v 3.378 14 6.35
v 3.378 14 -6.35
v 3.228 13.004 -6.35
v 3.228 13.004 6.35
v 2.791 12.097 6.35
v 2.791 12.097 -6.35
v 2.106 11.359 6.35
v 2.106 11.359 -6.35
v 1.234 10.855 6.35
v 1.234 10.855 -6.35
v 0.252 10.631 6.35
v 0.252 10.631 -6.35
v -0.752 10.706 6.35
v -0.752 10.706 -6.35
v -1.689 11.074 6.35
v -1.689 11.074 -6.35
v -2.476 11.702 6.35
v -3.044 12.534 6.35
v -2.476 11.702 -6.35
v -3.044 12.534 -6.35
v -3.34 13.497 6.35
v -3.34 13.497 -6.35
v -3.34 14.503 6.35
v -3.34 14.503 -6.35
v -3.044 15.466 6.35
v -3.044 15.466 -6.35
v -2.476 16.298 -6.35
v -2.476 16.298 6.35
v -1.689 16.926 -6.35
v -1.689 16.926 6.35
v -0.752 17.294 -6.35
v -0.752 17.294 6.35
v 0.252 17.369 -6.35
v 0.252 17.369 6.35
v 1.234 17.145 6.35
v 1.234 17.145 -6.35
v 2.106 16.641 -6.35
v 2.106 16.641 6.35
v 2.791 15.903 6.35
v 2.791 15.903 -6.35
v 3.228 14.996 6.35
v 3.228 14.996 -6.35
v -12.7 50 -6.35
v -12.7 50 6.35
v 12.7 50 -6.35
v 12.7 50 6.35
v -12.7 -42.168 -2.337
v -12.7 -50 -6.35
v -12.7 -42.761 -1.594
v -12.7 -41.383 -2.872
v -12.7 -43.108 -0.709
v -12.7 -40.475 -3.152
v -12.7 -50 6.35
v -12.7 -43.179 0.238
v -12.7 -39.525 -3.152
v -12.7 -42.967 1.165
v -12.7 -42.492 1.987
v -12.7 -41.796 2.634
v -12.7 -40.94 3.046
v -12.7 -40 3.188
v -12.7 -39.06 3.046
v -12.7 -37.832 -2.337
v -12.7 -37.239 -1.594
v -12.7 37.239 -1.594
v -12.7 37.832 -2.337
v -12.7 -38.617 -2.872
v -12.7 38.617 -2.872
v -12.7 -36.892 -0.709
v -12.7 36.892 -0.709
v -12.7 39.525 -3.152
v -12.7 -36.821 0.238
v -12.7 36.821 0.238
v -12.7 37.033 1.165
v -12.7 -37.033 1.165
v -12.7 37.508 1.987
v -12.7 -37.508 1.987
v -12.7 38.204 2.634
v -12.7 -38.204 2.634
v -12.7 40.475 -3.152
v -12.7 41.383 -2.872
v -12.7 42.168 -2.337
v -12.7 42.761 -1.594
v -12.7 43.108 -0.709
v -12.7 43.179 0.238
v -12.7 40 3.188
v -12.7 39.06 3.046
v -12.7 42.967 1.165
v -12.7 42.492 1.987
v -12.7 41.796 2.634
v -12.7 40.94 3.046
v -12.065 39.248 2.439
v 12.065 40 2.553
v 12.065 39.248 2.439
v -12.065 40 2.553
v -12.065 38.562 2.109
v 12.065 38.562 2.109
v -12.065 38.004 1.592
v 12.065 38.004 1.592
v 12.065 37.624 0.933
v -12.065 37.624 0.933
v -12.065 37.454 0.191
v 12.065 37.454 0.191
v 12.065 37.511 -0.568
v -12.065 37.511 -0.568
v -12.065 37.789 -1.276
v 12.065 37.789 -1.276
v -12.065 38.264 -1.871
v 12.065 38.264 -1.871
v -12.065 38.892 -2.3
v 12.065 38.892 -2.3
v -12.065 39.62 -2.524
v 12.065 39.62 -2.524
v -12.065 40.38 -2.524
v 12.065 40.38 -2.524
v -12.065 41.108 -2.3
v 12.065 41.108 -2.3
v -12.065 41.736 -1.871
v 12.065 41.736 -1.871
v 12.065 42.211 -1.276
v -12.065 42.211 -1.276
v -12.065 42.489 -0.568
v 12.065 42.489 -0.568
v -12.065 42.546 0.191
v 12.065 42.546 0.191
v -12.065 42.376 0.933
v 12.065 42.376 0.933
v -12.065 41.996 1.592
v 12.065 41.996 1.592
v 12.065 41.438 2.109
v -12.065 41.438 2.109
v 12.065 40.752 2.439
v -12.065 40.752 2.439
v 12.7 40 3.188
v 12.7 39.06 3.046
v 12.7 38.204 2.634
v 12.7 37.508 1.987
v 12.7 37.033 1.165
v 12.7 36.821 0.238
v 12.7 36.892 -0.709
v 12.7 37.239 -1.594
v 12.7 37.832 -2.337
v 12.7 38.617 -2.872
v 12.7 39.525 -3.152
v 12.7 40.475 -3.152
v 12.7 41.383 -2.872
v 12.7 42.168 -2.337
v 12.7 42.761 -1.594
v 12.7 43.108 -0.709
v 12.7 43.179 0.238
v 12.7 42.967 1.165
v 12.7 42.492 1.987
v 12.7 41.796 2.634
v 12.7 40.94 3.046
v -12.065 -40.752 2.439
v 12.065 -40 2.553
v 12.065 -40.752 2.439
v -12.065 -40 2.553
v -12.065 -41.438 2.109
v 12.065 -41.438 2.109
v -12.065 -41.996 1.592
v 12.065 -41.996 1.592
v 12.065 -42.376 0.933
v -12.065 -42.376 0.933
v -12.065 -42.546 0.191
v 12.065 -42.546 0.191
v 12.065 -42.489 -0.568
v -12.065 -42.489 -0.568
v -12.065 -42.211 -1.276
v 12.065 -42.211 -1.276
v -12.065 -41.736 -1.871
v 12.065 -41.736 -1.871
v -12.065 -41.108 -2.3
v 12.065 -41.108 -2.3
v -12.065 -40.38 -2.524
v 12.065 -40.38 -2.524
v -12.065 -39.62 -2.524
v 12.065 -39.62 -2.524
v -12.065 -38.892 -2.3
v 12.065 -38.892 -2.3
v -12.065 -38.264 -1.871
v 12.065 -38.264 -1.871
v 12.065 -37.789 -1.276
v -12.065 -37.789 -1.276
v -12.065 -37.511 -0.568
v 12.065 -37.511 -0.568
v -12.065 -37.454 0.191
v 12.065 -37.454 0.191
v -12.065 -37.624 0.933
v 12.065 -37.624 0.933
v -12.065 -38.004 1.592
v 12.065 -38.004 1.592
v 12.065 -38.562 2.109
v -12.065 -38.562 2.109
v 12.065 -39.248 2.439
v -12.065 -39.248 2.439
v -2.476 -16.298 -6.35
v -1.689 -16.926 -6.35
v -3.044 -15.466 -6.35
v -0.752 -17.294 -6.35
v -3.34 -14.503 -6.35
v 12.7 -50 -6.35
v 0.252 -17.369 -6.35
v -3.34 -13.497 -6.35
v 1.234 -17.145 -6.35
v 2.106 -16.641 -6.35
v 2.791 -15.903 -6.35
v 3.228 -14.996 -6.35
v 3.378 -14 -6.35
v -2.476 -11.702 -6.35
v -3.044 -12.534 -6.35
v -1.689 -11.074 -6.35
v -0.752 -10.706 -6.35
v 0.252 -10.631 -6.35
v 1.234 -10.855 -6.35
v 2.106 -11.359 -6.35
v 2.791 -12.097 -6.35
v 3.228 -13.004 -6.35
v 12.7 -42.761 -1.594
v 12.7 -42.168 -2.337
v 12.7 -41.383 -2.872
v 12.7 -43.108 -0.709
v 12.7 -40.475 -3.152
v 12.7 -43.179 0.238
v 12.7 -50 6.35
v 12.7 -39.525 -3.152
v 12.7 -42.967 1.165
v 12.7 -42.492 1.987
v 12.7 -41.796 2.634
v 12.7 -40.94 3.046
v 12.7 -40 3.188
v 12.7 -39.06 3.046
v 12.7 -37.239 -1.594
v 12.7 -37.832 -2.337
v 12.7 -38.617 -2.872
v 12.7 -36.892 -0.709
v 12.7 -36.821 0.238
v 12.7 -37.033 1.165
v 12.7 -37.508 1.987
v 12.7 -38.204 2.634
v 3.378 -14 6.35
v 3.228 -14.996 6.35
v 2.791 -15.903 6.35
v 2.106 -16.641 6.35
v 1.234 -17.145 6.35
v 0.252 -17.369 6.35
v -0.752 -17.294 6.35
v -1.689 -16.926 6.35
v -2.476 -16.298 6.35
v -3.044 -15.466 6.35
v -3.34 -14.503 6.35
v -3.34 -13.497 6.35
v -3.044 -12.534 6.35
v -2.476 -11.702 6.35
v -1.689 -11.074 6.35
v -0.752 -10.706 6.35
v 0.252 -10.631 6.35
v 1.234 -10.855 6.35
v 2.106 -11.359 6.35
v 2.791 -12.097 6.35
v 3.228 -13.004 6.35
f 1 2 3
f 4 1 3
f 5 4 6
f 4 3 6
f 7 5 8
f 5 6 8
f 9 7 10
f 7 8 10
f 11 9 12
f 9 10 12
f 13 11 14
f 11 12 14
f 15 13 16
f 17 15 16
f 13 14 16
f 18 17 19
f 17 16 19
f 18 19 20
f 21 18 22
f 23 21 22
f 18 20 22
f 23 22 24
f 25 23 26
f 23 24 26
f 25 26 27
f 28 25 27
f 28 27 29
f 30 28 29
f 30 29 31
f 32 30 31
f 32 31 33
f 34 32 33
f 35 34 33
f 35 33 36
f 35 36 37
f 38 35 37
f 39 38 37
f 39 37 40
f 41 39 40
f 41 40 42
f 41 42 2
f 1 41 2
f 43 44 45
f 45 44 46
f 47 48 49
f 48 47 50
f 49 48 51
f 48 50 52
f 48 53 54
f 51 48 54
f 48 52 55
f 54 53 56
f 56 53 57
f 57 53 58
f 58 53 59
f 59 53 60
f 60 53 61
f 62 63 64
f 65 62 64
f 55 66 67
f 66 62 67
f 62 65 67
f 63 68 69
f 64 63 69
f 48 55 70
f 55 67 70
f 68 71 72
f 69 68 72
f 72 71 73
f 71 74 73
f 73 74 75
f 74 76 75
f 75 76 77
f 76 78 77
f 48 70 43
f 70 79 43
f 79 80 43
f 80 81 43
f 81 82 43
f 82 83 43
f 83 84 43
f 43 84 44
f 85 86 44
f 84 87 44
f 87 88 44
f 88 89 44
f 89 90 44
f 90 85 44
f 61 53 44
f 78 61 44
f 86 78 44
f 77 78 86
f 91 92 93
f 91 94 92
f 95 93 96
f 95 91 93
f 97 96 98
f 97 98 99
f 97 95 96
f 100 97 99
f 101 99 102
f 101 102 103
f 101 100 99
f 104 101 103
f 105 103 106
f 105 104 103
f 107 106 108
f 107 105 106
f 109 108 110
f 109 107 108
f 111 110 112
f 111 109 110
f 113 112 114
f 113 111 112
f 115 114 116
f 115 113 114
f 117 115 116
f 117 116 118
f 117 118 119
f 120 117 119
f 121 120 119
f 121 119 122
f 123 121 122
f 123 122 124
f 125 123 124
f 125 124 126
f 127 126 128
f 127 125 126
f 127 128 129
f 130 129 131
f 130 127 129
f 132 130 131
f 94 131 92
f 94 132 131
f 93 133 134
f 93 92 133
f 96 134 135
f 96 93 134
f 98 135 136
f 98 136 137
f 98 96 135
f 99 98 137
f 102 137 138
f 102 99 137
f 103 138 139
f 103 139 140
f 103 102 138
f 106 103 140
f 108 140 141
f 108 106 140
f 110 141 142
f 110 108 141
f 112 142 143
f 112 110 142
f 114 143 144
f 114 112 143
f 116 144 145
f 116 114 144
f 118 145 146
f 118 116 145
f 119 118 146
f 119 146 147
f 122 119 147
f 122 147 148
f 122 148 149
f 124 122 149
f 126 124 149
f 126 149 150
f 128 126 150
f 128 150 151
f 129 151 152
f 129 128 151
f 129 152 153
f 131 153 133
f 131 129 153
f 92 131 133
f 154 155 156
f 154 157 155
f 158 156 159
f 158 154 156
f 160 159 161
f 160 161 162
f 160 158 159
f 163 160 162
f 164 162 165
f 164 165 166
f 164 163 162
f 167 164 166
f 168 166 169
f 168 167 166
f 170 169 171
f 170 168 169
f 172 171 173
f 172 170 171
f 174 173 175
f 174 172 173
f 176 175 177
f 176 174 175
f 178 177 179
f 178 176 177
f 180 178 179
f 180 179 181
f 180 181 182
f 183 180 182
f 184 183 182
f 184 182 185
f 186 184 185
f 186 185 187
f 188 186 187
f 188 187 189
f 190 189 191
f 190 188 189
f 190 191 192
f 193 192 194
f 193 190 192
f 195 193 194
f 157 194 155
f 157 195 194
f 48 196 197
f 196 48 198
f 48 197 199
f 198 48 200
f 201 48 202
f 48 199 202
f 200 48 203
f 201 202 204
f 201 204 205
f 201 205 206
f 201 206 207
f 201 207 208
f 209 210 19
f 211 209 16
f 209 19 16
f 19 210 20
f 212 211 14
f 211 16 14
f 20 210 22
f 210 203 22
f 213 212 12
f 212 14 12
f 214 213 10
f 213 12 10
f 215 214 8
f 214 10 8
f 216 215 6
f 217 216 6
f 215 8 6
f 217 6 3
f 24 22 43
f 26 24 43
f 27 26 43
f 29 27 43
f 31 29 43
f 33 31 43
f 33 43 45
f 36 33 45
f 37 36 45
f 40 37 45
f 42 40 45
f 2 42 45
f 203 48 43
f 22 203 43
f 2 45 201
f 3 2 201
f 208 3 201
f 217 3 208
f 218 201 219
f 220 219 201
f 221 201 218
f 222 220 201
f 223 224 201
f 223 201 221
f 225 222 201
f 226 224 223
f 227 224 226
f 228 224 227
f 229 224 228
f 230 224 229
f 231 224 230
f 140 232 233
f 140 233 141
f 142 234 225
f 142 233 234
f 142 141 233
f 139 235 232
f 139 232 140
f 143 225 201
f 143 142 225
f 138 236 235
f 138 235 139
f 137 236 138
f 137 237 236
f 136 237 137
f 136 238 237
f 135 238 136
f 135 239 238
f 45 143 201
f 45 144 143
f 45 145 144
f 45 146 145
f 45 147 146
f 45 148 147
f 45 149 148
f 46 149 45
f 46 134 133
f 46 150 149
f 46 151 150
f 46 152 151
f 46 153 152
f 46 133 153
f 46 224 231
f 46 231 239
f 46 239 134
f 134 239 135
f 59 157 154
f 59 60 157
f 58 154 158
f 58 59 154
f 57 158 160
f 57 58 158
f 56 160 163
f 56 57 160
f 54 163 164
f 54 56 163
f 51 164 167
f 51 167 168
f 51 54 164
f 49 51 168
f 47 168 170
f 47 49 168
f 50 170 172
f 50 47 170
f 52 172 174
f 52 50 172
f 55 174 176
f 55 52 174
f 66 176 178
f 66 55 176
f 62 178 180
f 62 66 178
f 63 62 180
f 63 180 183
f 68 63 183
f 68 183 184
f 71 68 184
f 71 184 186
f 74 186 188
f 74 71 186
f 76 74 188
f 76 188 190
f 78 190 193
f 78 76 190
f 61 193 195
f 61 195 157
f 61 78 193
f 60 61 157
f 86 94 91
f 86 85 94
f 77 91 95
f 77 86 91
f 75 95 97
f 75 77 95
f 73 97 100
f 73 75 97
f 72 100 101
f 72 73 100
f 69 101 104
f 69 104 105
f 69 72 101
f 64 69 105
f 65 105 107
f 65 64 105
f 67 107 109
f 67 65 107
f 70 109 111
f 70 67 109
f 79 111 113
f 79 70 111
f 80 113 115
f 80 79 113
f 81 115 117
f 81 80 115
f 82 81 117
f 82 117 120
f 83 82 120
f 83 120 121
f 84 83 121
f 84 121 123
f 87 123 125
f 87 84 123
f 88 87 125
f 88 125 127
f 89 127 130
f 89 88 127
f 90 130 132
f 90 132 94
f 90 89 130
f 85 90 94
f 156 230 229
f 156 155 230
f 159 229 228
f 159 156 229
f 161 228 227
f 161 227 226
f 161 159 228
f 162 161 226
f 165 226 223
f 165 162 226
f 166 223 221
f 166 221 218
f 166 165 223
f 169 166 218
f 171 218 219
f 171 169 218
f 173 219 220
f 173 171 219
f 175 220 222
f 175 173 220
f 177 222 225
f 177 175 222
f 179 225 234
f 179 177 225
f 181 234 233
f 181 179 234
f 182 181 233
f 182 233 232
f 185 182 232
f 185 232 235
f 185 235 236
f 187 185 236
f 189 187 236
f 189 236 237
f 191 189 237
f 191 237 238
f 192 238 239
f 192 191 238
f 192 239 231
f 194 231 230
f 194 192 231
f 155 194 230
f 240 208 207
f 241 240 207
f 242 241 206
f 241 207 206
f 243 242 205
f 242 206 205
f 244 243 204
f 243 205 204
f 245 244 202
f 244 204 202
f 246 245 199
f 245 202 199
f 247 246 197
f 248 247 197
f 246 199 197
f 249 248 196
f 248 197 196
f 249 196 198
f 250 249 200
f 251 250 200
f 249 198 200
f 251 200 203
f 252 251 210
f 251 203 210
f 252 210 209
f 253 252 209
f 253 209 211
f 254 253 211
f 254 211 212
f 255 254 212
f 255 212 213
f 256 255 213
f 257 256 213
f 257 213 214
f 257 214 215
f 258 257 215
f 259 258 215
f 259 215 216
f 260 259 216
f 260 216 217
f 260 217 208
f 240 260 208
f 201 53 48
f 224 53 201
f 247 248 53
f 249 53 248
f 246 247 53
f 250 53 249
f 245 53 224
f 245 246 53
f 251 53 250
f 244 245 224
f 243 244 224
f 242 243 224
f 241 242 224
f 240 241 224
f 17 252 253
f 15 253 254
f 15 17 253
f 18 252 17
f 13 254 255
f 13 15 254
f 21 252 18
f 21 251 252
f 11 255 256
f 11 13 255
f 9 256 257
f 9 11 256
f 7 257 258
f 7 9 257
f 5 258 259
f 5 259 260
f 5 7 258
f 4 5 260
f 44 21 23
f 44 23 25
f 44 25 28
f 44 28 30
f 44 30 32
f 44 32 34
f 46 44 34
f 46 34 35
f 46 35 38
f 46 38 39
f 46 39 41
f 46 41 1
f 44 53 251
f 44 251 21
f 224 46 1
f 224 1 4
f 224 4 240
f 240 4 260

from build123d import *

# Parameters (mm, degrees)
CROQUIS1_W                         = 25.4
CROQUIS1_H                         = 100
SALIENTE_EXTRUIR1_DEPTH            = 6.35
TALADRO_DE_MARGEN_PARA_1_41_D      = 6.7564
TALADRO_ROSCADO_1_4_202_AT_2_COUNT = 2
TALADRO_ROSCADO_1_4_202_AT_2_PITCH = 80


with BuildPart() as part:
    # Croquis1 → Saliente-Extruir1 (new, symmetric)
    with BuildSketch(Plane.XY):
        Rectangle(CROQUIS1_W, CROQUIS1_H)
    extrude(amount=SALIENTE_EXTRUIR1_DEPTH, both=True)

    # Taladro de margen para 1/41 (through all)
    with Locations(Plane(origin=(-6.35, 0, 6.35), x_dir=(-1, 0, 0), z_dir=(0, 0, 1))):
        with Locations((-6.35, 14), (-6.35, -14)):
            Hole(TALADRO_DE_MARGEN_PARA_1_41_D / 2)

    # Croquis7 → Taladro roscado 1/4-202 (revolve, cut)
    with BuildSketch(Plane(origin=(-12.7, 40, 0), x_dir=(0, 0, 1), z_dir=(0, 1, 0))):
        Polygon((0, 0), (0, 25.4), (3.1877, 25.4), (2.5527, 24.765), (2.5527, 0.635), (3.1877, 0), align=None)
    taladro_roscado_1_4_202 = revolve(axis=Axis((-19.05, 40, 0), (1, 0, 0)), mode=Mode.SUBTRACT)

    # Taladro roscado 1/4-202 at 2: Taladro roscado 1/4-202 ×2
    with Locations(*[(0, -i * TALADRO_ROSCADO_1_4_202_AT_2_PITCH, 0) for i in range(1, TALADRO_ROSCADO_1_4_202_AT_2_COUNT)]):
        add(taladro_roscado_1_4_202, mode=Mode.SUBTRACT)


solid = part.part
